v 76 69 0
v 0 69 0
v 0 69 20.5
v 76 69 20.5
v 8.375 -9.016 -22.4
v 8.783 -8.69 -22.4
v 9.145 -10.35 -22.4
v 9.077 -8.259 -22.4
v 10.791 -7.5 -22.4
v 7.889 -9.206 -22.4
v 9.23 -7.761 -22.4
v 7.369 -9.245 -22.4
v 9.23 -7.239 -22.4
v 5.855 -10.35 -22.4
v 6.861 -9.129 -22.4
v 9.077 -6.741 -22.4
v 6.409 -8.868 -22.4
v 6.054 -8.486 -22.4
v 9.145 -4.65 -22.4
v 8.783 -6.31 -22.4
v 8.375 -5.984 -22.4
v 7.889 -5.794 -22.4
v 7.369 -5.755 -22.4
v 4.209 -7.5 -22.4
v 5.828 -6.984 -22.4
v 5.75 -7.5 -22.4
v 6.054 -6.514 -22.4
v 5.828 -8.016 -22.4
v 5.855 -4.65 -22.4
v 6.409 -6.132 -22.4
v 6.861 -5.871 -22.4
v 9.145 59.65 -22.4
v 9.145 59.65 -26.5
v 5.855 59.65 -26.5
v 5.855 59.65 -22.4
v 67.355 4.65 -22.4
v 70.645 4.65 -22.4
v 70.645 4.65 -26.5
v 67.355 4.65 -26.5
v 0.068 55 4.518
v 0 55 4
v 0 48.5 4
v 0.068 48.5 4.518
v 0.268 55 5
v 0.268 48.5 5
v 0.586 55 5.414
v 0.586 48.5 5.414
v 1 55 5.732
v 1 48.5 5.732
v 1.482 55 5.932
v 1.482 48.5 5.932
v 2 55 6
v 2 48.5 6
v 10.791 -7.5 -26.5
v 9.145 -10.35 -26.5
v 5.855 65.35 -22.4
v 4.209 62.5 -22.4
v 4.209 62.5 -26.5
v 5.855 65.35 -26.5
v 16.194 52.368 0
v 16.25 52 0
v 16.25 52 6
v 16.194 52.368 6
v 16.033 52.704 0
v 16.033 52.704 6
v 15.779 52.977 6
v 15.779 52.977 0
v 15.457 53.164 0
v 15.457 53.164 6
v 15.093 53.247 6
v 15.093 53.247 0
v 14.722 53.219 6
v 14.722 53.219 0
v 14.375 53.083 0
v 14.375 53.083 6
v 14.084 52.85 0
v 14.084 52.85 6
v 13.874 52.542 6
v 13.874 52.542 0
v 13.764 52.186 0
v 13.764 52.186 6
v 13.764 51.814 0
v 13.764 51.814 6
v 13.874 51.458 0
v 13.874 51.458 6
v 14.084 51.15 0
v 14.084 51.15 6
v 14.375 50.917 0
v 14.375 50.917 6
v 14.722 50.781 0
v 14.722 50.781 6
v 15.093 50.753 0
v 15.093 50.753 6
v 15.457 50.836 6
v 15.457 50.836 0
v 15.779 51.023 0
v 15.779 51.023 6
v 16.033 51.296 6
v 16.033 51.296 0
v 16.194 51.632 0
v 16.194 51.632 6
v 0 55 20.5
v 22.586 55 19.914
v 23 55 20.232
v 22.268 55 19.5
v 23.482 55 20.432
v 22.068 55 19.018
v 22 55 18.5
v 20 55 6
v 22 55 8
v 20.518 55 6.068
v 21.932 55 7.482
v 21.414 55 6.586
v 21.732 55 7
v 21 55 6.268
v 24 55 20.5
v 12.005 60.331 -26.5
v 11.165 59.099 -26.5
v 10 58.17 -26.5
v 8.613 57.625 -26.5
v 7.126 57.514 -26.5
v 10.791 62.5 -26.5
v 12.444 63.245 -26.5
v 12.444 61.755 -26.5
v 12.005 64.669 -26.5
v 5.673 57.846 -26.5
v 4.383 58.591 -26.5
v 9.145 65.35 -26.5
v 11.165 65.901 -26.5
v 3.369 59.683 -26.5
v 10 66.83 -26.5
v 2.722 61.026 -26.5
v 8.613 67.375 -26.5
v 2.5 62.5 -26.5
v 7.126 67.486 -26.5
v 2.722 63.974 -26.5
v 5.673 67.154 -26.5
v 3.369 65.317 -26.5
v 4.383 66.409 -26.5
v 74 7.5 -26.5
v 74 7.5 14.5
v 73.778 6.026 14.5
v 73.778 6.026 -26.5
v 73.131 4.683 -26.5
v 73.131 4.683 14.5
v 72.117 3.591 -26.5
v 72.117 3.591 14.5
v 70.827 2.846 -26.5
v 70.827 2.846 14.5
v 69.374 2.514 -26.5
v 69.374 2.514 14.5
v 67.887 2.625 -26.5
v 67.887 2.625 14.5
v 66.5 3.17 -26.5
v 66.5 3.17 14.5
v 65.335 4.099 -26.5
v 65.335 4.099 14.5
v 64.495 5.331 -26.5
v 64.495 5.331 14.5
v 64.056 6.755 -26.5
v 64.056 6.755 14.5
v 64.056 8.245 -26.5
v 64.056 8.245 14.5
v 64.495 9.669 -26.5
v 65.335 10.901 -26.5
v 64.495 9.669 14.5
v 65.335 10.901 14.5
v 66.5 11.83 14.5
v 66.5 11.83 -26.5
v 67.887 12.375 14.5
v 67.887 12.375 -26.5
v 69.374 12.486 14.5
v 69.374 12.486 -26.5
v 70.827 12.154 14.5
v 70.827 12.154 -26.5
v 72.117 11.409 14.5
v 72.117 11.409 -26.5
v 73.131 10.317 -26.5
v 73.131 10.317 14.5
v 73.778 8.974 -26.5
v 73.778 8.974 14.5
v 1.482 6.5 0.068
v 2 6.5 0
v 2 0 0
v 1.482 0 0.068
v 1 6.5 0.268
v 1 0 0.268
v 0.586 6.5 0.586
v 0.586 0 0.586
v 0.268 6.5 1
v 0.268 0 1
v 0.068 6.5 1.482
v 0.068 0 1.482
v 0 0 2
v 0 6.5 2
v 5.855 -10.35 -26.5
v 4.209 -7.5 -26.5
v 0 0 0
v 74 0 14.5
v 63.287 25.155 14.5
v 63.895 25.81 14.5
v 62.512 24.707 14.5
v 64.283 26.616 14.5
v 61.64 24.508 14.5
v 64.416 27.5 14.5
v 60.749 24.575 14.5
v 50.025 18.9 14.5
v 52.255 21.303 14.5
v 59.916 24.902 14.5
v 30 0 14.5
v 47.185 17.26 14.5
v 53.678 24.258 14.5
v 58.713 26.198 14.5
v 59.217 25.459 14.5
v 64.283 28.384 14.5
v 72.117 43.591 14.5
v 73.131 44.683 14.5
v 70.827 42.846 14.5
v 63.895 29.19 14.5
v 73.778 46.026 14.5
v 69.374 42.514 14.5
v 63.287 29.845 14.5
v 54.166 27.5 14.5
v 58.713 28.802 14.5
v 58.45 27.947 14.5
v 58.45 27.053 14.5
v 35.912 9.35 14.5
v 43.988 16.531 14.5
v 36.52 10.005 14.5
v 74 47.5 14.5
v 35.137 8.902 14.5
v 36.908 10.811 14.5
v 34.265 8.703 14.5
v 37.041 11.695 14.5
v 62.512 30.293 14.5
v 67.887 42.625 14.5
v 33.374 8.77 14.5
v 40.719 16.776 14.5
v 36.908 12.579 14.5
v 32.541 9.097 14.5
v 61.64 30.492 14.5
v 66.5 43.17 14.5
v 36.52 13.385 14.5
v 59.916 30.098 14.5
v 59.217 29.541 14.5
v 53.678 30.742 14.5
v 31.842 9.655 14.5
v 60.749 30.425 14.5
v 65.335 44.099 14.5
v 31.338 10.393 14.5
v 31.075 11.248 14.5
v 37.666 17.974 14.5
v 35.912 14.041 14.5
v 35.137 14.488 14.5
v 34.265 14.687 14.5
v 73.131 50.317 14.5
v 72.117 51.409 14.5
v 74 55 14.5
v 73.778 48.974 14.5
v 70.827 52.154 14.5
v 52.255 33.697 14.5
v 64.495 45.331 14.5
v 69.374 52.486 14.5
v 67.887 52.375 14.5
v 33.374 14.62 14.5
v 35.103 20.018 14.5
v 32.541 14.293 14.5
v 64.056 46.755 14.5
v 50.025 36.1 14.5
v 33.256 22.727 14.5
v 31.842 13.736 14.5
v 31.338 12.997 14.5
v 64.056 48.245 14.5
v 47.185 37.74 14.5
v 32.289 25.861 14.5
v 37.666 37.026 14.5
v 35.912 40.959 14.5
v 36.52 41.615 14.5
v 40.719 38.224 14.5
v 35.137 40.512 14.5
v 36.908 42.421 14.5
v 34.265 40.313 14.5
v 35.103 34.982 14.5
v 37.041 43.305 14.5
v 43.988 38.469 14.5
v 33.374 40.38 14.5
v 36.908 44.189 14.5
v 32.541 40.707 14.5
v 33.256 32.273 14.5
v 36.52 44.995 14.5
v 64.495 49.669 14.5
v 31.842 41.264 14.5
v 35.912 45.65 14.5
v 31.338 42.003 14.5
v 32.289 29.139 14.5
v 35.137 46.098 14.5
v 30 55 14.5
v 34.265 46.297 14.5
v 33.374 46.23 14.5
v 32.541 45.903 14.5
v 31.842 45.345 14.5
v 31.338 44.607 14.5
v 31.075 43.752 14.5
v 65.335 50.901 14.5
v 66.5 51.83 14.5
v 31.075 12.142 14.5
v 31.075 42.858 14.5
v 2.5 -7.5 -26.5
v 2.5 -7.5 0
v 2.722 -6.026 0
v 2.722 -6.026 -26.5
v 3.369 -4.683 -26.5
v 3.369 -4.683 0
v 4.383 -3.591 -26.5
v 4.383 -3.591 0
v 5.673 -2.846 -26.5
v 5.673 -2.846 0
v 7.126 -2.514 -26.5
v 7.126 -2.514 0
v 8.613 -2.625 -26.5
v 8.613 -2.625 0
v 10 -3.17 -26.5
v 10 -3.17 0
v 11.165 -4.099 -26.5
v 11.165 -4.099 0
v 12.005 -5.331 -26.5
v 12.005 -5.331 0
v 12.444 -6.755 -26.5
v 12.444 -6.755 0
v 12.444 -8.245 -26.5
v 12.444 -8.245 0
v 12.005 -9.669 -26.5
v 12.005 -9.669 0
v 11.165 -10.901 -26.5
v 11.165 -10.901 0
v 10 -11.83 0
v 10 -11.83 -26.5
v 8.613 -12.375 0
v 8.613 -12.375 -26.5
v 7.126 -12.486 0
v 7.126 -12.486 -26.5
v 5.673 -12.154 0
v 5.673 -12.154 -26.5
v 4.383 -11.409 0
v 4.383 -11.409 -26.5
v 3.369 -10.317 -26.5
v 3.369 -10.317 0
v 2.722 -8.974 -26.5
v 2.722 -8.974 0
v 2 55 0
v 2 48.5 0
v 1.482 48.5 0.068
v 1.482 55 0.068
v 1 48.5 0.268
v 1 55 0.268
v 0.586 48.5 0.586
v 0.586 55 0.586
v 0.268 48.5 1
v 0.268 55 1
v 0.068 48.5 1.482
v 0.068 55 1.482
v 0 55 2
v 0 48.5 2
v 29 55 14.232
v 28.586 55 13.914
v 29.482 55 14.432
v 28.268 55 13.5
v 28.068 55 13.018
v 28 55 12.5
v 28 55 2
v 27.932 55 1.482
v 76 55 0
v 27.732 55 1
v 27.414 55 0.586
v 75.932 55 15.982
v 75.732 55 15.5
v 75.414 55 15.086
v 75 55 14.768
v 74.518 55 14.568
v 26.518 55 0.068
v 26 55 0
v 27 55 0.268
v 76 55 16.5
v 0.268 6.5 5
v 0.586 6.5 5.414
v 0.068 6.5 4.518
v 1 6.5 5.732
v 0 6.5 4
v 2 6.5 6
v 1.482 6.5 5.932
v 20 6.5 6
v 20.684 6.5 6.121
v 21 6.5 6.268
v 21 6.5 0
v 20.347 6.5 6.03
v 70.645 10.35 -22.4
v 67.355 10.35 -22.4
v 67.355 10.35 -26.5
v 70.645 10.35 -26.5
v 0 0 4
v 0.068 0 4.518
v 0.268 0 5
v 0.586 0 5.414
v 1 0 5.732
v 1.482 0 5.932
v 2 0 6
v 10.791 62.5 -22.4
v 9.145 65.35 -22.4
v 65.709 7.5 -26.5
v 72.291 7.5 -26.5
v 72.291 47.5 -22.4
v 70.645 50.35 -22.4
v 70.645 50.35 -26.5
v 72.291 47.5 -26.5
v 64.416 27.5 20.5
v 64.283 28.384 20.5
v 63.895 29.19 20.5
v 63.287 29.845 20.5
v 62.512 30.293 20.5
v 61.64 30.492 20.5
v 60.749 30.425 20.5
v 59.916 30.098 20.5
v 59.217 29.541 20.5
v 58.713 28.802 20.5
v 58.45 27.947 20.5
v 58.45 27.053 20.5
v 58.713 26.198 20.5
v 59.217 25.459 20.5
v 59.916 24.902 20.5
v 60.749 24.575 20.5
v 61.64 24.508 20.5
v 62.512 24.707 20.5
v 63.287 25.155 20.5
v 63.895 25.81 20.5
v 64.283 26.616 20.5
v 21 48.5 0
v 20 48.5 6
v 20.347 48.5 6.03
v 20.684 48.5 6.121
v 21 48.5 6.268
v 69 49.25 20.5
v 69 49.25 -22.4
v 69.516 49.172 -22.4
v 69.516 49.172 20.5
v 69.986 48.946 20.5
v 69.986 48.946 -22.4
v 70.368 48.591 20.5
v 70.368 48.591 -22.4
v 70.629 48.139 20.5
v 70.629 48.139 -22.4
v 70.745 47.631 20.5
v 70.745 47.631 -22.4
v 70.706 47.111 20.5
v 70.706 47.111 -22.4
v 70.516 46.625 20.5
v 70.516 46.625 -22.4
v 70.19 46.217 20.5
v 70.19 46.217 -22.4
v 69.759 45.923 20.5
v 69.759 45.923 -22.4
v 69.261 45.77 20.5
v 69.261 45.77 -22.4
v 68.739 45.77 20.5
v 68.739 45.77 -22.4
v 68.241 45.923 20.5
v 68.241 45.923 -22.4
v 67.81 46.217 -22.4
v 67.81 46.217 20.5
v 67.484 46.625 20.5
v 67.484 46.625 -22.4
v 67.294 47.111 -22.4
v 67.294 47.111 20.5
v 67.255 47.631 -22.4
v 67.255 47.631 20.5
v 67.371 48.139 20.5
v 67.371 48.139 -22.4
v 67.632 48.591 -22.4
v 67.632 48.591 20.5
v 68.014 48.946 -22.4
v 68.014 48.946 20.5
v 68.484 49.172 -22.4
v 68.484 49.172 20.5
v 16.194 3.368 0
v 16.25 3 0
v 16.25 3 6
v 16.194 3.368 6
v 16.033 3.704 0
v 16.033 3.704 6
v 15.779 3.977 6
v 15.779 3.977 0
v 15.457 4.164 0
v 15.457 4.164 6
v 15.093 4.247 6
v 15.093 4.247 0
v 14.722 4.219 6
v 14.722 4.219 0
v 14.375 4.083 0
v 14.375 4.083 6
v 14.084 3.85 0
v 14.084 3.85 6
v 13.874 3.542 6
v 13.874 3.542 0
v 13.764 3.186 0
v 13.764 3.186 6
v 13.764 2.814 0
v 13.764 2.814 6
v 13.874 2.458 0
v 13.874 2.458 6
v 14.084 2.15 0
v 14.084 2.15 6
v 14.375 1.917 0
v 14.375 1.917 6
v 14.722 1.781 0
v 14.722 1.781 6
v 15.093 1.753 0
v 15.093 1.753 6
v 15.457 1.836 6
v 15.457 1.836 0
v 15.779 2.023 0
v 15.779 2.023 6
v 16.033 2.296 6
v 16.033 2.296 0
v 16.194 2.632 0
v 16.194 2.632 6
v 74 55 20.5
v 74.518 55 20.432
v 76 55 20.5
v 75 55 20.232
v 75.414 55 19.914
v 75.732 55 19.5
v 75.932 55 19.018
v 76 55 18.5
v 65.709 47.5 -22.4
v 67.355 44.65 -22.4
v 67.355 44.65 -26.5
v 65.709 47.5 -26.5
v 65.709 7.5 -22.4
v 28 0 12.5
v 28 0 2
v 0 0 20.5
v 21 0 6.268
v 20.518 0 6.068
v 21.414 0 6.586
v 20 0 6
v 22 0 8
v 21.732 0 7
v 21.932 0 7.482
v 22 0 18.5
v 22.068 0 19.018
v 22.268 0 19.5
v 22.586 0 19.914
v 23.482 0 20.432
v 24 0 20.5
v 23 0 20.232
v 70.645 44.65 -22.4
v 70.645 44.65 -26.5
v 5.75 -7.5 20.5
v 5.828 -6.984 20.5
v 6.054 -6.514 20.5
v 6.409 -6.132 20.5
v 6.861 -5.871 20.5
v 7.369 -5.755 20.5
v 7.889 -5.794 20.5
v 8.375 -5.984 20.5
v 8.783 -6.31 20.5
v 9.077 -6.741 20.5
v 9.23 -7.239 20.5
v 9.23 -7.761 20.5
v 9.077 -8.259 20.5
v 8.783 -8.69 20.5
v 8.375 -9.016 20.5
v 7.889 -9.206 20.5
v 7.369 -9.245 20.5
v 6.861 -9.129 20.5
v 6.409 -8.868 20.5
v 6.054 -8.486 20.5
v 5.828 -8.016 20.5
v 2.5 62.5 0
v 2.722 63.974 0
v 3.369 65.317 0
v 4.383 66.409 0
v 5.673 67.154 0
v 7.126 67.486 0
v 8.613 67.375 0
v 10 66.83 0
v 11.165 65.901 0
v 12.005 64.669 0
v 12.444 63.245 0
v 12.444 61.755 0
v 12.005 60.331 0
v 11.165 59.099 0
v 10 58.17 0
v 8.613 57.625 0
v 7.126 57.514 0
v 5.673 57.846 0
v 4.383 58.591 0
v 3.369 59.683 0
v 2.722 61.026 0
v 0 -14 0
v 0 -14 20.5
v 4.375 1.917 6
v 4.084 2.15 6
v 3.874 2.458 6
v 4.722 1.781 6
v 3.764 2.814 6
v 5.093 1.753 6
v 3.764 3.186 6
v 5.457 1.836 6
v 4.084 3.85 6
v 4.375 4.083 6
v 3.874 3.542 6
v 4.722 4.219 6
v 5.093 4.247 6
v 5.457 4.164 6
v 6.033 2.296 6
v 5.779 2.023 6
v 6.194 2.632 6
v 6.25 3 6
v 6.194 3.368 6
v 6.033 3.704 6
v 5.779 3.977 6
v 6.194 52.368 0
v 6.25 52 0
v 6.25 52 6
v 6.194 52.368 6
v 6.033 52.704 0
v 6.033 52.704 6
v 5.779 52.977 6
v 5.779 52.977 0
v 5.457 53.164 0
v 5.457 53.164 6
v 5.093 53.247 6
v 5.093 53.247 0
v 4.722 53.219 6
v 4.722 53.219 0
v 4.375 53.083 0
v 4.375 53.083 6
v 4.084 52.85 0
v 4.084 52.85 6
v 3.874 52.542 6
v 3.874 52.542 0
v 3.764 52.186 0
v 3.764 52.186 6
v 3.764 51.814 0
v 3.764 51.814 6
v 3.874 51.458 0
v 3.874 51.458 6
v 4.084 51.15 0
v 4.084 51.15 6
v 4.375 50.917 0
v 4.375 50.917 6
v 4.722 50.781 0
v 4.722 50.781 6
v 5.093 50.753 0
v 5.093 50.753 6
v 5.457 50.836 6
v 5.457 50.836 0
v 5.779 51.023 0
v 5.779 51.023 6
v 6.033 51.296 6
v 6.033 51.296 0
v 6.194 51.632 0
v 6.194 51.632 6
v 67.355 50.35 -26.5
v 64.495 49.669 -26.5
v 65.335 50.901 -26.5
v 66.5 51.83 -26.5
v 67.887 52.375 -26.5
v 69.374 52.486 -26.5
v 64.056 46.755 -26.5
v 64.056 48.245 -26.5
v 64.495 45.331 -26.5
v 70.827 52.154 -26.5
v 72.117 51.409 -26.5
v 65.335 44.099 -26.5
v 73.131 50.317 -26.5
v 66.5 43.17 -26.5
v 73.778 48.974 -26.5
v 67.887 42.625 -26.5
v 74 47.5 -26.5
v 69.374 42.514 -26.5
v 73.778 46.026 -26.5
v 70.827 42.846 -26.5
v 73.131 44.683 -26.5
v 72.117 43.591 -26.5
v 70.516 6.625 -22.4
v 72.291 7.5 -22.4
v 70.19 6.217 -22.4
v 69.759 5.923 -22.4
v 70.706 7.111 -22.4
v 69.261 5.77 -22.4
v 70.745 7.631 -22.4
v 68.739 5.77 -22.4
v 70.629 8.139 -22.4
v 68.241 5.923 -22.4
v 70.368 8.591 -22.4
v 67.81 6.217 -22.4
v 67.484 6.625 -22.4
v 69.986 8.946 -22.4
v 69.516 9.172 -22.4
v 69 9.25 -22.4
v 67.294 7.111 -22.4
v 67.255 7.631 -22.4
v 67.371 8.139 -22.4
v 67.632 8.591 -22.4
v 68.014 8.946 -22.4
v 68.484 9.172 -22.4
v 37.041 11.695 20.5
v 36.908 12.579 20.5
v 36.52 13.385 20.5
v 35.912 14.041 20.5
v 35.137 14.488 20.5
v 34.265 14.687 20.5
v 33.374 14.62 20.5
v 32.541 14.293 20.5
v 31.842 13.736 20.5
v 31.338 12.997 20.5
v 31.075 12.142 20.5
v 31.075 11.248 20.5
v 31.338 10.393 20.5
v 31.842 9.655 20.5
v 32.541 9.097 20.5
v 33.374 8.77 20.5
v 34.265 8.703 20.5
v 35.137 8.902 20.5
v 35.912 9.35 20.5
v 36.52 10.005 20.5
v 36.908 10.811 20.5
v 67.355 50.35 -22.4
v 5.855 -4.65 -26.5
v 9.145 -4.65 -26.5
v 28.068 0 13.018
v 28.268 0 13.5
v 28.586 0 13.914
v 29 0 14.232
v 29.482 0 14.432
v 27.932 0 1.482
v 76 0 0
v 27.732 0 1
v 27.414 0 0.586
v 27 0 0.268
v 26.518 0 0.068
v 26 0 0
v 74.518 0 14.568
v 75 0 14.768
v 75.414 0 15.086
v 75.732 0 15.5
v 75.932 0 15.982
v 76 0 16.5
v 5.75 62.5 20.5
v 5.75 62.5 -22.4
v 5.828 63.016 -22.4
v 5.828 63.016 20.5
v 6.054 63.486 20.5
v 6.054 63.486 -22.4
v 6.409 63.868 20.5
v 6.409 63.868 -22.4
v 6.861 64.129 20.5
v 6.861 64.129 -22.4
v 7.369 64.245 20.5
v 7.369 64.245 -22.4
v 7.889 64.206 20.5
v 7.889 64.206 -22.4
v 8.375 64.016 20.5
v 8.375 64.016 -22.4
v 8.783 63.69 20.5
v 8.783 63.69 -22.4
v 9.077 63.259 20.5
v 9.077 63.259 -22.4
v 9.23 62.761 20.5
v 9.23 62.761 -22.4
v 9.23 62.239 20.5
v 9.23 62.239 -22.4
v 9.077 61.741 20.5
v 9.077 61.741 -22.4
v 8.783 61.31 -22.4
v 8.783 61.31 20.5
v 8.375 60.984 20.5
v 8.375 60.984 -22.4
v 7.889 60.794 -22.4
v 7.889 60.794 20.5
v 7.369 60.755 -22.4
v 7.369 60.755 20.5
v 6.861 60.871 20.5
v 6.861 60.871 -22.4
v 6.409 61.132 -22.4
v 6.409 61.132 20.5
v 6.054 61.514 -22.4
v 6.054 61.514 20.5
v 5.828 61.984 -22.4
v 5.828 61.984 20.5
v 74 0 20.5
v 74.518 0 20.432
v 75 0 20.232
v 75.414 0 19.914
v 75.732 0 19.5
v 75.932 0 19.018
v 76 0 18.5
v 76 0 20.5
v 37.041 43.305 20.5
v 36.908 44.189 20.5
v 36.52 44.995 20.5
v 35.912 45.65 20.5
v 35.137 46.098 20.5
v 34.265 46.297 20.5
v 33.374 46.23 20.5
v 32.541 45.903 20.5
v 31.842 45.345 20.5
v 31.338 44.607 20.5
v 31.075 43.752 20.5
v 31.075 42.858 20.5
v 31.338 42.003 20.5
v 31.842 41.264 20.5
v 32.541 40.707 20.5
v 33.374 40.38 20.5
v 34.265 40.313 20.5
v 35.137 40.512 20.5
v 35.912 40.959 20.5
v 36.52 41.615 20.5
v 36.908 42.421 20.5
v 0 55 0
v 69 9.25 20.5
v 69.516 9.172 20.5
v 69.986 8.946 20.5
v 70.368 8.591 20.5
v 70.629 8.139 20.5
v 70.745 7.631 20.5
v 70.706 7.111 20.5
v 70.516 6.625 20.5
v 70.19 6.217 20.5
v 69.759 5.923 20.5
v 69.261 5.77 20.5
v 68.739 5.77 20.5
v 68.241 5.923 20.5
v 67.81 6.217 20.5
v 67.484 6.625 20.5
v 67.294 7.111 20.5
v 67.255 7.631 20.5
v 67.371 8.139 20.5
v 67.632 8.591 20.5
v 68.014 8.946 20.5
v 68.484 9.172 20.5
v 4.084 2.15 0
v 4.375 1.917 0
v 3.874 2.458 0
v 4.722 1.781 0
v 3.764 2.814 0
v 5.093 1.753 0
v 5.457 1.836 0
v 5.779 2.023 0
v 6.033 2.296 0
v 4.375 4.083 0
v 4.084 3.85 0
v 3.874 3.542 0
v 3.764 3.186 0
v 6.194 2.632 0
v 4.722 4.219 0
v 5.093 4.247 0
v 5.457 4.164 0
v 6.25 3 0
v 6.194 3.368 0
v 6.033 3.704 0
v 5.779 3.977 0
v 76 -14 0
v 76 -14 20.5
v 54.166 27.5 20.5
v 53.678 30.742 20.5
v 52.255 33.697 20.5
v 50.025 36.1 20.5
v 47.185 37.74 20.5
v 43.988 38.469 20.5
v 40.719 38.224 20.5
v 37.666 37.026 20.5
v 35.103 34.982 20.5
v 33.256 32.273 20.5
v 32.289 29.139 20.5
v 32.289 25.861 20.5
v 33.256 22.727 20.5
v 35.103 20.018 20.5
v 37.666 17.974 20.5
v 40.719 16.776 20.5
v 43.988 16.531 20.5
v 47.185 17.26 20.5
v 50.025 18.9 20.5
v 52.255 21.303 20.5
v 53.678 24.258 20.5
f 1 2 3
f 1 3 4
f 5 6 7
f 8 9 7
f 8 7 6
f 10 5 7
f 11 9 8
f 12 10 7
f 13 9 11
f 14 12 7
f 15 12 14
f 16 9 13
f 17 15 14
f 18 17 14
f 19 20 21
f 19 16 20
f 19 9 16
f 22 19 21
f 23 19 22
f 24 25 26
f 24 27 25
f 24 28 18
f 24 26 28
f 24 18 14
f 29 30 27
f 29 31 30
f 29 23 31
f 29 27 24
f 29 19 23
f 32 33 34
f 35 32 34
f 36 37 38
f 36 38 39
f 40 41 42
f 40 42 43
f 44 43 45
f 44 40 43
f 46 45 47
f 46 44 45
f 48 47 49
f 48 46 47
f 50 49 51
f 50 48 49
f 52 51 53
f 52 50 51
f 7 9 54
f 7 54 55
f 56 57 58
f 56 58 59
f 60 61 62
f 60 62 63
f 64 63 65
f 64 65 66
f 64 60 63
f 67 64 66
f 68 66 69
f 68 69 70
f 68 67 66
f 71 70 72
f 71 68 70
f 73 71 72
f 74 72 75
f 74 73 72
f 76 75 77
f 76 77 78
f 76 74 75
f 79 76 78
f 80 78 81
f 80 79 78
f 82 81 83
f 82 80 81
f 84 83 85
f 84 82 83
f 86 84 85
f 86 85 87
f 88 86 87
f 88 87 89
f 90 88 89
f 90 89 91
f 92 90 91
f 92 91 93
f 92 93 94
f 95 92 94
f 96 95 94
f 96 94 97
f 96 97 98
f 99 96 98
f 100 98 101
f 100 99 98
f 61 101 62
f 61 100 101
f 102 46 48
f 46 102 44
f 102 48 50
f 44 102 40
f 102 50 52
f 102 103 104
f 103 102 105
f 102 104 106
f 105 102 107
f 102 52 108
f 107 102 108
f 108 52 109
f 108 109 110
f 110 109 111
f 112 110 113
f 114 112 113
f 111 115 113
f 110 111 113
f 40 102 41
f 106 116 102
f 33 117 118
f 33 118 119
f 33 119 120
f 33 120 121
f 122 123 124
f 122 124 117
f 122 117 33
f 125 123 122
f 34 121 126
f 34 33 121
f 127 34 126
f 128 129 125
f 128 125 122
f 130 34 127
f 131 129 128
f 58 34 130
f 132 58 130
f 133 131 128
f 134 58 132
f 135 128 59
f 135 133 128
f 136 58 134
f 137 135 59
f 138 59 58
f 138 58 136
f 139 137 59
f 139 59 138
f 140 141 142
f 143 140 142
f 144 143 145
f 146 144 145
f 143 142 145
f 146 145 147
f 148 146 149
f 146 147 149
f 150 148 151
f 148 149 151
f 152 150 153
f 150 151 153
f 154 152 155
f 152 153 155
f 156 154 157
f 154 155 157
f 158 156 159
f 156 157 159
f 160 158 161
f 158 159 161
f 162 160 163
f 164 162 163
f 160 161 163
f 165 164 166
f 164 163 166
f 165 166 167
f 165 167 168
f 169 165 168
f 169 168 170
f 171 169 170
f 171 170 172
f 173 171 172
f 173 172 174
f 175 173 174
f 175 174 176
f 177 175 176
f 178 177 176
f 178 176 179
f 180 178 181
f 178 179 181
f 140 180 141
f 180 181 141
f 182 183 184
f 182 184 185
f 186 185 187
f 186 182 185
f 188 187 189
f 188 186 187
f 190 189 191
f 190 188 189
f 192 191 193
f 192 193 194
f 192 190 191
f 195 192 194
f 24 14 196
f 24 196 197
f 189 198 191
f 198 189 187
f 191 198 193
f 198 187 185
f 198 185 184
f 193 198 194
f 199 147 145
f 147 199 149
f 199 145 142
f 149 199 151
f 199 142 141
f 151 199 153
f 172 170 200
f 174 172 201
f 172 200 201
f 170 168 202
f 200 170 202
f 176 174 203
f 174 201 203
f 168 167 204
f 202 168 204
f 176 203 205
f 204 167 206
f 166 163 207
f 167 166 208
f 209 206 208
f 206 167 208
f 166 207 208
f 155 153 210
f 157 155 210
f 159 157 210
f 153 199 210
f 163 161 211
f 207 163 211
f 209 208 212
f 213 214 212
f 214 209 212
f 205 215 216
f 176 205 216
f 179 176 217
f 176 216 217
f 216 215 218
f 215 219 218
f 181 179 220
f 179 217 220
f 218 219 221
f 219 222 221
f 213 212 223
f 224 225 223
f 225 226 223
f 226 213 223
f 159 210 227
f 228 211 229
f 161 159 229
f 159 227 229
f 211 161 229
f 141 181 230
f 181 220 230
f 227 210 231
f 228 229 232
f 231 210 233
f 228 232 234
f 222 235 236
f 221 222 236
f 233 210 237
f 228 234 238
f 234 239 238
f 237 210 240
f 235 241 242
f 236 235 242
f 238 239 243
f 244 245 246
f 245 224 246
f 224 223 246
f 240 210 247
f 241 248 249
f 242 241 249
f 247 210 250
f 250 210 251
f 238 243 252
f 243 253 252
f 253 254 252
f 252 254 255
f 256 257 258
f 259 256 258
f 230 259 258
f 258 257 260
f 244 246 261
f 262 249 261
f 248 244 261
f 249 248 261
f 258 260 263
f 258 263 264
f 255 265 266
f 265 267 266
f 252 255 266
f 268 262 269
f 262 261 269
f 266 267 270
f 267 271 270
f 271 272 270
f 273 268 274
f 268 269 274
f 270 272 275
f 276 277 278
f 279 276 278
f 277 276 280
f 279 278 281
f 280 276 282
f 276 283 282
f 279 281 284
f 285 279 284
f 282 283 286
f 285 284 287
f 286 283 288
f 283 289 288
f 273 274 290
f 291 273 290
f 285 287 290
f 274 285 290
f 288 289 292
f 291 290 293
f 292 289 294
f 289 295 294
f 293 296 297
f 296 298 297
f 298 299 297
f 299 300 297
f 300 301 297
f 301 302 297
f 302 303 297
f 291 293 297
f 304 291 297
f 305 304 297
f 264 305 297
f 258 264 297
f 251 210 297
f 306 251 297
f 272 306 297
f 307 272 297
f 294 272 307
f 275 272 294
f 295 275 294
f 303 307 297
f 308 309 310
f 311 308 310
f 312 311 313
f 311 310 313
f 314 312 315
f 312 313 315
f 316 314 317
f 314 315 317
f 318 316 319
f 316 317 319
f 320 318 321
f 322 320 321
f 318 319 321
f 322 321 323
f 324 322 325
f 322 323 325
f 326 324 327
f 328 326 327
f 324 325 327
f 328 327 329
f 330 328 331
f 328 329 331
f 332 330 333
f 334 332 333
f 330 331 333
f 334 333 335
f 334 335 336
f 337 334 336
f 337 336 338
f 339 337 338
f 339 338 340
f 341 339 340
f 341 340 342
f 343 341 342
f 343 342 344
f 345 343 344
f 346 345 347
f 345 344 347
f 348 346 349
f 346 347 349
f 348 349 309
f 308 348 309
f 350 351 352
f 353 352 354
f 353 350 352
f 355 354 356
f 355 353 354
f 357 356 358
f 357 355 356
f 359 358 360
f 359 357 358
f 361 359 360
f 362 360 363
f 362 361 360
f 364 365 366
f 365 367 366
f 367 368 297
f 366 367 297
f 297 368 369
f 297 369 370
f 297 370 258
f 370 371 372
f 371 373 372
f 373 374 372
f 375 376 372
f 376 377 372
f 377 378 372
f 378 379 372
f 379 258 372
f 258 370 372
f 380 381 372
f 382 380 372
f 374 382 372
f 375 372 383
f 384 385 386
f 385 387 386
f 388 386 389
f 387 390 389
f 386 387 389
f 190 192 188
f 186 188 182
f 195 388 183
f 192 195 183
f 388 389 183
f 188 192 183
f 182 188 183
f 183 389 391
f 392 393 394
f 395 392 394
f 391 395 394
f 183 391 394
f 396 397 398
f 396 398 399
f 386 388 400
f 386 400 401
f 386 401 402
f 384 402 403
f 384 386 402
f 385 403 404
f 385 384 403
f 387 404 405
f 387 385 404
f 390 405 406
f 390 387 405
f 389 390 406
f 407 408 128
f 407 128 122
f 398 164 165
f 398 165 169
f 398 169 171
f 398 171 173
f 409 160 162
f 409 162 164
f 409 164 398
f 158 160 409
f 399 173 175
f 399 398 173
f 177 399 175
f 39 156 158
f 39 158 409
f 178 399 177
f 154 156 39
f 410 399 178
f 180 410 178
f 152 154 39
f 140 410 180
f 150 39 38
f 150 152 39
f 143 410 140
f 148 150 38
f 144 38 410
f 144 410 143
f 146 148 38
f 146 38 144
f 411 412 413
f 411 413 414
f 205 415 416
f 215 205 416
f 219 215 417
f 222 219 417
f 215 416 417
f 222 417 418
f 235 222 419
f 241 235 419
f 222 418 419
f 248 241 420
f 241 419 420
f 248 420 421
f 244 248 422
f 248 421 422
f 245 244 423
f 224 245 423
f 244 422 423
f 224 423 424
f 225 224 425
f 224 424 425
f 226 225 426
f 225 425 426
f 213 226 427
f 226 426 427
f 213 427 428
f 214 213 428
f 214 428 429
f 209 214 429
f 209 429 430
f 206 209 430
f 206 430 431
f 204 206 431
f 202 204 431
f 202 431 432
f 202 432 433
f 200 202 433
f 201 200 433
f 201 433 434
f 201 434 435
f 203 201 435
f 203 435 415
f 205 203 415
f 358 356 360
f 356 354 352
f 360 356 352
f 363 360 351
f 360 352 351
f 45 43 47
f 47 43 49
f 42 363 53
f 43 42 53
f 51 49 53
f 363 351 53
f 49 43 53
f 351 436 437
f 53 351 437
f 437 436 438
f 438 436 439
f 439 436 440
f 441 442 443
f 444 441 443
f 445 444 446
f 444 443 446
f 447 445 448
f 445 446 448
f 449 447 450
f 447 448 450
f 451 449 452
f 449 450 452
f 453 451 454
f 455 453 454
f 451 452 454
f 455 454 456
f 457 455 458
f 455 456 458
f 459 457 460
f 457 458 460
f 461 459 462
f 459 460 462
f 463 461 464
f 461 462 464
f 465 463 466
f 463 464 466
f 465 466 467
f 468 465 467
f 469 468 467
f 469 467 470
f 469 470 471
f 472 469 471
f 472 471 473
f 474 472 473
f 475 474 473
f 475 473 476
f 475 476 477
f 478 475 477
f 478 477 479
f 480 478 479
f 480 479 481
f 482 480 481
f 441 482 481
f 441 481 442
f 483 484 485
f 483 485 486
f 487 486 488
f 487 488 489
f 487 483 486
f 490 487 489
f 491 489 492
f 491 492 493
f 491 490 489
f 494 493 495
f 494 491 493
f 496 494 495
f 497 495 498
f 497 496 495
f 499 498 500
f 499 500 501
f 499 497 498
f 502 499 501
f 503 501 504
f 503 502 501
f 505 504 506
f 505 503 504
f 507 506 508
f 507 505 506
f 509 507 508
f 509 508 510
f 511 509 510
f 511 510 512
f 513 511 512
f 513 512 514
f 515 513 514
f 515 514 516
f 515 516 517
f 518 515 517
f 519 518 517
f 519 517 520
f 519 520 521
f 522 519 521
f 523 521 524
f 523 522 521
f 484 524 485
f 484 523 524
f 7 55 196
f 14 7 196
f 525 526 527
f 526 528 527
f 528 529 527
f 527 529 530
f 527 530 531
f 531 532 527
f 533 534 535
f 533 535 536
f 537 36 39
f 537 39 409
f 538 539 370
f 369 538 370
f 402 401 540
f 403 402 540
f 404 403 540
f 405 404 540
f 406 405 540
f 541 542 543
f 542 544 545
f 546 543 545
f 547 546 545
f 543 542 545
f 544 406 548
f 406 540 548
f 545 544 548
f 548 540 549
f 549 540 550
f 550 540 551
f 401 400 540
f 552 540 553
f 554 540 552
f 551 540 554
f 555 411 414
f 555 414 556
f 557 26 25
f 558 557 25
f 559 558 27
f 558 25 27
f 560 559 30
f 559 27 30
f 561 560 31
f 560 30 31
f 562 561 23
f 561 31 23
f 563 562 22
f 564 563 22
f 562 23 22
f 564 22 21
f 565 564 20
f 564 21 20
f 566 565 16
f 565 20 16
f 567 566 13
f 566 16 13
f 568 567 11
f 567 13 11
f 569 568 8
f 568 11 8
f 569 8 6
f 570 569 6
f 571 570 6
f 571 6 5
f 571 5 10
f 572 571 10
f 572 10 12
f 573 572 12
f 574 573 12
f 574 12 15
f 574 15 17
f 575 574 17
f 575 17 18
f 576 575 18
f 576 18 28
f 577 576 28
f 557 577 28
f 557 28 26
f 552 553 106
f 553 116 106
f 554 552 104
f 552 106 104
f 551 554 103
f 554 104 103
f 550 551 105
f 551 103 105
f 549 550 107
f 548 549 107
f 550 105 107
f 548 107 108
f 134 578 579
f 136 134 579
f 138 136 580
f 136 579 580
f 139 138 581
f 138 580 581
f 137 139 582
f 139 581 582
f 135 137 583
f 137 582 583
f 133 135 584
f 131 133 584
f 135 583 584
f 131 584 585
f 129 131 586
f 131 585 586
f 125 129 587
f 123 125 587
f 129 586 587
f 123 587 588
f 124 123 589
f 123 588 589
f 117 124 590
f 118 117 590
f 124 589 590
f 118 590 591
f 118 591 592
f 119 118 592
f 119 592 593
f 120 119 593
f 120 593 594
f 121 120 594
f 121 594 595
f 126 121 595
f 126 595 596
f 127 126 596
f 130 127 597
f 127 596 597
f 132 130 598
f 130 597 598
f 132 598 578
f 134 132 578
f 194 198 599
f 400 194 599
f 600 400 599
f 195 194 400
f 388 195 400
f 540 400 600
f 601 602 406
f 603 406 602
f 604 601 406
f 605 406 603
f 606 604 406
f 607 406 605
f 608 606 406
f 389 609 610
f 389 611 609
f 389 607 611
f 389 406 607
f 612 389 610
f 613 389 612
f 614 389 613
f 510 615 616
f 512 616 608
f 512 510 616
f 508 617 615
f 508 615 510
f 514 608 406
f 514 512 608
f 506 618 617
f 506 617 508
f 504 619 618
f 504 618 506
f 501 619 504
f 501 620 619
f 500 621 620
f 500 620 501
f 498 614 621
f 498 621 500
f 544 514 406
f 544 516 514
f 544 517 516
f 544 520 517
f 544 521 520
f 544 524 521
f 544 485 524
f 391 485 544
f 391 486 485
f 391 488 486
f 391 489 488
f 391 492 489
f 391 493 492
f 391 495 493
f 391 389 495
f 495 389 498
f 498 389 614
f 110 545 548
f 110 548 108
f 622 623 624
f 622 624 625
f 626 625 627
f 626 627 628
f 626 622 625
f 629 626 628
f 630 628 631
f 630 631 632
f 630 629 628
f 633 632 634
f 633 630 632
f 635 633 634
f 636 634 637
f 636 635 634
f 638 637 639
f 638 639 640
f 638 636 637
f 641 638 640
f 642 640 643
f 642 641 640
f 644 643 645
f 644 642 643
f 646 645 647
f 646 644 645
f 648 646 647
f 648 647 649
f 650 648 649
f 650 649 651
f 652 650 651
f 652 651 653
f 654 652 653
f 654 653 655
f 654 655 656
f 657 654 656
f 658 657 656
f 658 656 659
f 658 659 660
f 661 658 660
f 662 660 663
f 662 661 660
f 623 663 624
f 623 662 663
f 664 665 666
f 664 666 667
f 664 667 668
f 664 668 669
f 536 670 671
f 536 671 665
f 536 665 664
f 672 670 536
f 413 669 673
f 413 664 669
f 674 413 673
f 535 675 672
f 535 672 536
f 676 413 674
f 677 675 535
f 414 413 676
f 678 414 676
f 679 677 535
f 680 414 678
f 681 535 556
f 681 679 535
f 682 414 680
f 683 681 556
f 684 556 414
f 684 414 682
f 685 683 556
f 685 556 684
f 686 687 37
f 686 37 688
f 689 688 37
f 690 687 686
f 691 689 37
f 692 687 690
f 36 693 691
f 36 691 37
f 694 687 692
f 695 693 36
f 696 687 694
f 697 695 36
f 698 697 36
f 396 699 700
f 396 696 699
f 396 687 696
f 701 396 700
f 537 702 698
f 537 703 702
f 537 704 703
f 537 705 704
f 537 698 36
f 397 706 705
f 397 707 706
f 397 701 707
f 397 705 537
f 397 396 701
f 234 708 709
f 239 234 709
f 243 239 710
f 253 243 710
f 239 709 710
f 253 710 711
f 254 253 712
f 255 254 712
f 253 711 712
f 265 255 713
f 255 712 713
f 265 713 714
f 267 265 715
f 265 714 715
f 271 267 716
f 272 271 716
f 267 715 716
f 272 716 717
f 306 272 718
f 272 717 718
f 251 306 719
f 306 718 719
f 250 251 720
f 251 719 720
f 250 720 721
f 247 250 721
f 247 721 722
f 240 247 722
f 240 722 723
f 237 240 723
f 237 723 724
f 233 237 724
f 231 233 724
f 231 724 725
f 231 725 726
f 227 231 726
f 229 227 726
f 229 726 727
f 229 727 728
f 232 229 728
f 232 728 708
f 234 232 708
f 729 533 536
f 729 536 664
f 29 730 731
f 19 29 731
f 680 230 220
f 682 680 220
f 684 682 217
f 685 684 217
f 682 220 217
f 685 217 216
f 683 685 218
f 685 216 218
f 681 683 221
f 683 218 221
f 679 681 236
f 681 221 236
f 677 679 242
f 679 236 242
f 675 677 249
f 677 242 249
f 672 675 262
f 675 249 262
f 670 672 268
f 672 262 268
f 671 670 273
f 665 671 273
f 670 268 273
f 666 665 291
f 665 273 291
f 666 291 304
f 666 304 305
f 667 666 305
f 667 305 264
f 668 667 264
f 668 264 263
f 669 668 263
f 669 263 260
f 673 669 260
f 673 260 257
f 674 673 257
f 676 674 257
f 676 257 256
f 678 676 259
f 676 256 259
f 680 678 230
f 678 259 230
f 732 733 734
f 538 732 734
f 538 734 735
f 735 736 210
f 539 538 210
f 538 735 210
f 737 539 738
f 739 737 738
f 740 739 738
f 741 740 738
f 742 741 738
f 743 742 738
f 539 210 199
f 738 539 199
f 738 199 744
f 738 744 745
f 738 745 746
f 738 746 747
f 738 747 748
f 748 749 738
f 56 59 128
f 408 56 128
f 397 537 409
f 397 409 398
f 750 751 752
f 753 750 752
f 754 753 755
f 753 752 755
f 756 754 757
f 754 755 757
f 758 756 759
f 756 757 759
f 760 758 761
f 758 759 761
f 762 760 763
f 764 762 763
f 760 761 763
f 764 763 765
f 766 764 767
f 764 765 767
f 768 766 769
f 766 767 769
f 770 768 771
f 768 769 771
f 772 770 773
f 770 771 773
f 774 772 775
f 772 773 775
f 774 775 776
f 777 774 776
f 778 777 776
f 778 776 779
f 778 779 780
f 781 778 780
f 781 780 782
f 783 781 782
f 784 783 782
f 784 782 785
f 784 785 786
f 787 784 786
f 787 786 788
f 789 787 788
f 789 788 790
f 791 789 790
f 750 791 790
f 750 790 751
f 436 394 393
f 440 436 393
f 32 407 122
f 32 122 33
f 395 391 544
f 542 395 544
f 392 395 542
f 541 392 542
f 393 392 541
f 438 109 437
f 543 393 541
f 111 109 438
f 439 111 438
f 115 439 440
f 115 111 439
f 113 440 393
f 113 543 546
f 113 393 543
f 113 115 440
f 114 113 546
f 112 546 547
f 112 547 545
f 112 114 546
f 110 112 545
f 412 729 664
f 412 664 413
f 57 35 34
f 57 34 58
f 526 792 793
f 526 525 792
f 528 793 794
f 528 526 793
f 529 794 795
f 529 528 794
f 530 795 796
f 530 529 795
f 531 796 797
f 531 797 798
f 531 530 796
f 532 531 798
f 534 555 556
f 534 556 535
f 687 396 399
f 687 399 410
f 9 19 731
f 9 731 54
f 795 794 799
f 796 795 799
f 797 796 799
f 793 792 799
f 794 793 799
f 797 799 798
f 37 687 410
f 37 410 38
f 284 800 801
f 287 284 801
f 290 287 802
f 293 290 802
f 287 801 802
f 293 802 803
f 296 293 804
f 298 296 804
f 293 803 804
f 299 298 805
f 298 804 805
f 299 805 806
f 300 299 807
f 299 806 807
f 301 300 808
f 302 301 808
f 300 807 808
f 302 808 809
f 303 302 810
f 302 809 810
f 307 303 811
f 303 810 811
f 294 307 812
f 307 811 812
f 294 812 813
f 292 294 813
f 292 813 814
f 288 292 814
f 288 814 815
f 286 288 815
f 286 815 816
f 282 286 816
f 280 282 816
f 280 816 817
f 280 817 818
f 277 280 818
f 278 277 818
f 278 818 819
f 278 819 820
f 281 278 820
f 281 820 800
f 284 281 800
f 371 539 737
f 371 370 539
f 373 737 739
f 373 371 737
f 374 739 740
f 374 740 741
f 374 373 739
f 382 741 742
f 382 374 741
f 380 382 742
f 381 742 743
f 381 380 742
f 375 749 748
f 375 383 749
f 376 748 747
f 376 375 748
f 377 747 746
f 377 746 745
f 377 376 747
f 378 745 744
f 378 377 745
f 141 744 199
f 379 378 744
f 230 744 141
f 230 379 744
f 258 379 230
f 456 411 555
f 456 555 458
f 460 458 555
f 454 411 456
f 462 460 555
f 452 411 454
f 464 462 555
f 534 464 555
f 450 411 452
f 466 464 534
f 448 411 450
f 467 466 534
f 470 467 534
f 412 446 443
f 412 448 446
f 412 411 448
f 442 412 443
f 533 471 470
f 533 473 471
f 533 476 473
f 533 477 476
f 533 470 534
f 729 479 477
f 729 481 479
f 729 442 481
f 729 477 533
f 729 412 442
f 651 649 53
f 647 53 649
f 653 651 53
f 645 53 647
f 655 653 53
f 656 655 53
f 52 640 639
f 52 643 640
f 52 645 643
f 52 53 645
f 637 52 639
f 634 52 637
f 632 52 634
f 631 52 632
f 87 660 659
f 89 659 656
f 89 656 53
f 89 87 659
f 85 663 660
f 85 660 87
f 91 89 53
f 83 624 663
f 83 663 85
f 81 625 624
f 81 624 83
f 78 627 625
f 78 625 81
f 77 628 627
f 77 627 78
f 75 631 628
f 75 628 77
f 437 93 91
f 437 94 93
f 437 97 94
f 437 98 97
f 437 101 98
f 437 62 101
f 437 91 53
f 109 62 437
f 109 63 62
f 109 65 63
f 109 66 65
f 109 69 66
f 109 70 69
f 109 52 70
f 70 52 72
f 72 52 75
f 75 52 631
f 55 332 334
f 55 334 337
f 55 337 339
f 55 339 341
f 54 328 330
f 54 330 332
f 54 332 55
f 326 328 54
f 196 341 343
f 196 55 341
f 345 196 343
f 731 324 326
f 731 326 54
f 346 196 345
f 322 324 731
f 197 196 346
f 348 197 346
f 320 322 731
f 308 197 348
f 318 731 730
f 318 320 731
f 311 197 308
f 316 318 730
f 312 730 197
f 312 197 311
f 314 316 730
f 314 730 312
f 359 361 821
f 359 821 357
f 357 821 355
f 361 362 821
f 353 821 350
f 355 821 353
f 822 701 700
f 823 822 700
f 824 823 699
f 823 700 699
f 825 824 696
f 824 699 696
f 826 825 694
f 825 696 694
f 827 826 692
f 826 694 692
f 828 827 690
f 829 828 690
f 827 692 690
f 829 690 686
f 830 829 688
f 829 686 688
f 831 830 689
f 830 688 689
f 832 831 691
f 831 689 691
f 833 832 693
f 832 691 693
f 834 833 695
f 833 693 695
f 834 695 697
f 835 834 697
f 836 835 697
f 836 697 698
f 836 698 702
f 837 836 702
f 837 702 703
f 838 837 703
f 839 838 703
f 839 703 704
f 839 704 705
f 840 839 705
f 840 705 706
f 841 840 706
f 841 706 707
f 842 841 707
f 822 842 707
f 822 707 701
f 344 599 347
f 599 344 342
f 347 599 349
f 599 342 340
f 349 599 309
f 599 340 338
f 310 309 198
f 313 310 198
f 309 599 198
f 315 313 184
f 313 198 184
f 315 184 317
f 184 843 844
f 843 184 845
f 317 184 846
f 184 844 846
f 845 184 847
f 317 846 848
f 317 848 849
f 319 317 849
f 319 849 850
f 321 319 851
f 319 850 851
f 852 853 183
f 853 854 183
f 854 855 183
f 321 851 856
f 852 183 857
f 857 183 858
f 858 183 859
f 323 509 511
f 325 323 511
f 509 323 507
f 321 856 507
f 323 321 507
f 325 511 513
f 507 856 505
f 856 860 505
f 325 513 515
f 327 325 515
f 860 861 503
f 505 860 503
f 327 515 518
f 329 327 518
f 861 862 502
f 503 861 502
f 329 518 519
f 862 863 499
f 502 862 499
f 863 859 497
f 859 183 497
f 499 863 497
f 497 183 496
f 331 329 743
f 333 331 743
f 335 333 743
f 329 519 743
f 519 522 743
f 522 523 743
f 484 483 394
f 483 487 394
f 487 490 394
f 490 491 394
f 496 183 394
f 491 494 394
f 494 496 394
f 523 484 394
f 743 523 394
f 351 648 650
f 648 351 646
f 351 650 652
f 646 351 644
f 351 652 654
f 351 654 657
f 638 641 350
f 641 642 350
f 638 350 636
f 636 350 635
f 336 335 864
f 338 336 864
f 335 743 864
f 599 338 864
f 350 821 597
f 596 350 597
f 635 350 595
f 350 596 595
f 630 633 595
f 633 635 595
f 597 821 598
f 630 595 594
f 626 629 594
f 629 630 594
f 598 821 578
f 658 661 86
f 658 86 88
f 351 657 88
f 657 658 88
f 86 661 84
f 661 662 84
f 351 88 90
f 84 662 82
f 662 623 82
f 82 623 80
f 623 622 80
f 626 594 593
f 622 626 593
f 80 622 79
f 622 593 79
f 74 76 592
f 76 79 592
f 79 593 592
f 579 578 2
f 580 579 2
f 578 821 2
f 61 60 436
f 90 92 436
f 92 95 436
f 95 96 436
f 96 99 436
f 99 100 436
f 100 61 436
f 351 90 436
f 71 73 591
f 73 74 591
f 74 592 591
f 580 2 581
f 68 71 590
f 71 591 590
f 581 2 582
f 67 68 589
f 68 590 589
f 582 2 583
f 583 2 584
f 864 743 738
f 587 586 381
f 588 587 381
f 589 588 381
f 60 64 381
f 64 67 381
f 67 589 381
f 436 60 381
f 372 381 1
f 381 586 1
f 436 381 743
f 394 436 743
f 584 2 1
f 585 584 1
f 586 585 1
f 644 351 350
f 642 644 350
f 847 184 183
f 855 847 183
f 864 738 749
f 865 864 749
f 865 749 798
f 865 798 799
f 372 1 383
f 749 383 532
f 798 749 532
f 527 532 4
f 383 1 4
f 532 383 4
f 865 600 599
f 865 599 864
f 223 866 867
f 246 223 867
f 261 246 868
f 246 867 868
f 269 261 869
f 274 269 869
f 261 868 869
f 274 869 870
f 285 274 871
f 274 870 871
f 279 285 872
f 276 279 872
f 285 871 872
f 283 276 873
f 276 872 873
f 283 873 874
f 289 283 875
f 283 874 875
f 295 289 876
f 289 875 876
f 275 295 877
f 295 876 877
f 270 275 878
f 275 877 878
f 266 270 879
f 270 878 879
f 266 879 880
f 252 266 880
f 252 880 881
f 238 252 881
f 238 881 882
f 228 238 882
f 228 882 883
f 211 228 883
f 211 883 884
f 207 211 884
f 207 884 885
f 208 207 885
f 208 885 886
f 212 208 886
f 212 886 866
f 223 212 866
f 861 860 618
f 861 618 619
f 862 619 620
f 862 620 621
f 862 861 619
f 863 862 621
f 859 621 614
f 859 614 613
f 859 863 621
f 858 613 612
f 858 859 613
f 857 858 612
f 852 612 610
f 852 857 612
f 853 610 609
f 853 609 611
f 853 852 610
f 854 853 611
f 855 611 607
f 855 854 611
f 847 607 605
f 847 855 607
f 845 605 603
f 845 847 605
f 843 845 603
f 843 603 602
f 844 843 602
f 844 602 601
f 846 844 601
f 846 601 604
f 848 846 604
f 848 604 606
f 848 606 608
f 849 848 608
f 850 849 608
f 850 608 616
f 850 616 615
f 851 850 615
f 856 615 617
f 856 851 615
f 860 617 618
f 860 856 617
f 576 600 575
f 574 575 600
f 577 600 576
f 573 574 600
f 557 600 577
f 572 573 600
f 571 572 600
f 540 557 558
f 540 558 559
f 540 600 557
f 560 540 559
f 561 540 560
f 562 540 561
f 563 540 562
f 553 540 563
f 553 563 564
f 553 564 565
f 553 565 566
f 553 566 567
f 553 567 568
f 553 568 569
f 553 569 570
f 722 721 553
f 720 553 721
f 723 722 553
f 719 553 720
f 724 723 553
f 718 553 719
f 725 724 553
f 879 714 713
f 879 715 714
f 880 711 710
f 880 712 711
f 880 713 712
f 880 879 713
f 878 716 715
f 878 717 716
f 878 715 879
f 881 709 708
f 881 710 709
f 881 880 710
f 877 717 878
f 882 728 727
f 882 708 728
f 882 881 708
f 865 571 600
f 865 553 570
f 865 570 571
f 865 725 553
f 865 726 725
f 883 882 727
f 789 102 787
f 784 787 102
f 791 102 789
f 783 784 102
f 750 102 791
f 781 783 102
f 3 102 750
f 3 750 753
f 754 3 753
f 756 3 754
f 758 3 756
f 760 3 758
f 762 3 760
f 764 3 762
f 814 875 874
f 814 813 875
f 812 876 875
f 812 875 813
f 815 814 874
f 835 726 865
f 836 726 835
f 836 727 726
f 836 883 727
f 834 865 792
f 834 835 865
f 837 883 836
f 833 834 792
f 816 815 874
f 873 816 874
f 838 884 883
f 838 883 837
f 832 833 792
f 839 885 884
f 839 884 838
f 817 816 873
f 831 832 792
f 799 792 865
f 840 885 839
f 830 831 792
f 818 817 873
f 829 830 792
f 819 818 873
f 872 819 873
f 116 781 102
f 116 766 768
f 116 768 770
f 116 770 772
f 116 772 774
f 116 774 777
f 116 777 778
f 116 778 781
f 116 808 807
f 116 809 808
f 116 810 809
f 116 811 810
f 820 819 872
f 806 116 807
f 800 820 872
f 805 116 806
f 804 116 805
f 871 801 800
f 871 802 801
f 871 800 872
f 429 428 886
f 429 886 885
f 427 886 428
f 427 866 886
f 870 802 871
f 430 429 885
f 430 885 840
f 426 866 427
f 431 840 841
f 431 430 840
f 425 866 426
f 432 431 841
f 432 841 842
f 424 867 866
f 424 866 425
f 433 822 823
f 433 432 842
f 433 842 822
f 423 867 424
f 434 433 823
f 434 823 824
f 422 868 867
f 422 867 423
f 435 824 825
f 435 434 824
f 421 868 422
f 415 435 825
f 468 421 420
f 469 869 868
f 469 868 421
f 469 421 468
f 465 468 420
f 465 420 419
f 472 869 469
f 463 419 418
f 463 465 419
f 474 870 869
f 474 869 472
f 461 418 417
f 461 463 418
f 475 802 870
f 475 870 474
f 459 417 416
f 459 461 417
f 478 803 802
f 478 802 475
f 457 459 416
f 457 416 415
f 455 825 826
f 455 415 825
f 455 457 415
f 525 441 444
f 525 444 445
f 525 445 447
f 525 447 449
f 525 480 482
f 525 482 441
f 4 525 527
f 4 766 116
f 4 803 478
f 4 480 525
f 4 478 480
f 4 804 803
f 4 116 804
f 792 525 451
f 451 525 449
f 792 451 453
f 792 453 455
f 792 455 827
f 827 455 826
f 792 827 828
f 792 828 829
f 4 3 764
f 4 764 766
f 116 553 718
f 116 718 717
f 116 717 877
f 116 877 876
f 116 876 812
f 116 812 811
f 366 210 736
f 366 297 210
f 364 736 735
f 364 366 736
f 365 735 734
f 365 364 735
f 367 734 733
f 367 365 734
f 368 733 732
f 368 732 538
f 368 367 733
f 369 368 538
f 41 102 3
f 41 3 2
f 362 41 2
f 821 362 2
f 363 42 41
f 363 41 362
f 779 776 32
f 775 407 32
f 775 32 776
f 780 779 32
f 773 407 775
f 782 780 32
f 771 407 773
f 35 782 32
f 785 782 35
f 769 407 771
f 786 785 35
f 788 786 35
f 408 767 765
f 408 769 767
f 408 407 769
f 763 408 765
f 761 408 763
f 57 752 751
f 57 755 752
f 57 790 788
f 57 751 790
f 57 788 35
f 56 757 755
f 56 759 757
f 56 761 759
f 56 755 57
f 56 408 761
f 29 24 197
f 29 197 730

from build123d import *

# Parameters (mm, degrees)
SKETCH1_W               = 28
SKETCH1_H               = 55
SKETCH1_R               = 1.25
BOSS_EXTRUDE1_DEPTH     = 6
SKETCH2_W               = 6
SKETCH2_H               = 55
BOSS_EXTRUDE2_DEPTH     = 14.5
SKETCH3_W               = 6
SKETCH3_H               = 55
BOSS_EXTRUDE3_DEPTH     = 48
SKETCH4_R               = 3
SKETCH4_R_2             = 11
CUT_EXTRUDE1_DEPTH      = 48
FILLET4_R               = 2
SKETCH5_W               = 21
SKETCH5_H               = 42
CUT_EXTRUDE2_DEPTH      = 10
FILLET5_R               = 2
ESQUISSE2_R             = 5
BOSS_EXTRU_3_DEPTH      = 41
ESQUISSE3_R             = 1.75
ENL_V_MAT_EXTRU_1_DEPTH = 105.928547117
ESQUISSE4_W             = 76
ESQUISSE4_H             = 20.5
BOSS_EXTRU_4_DEPTH      = 14
ESQUISSE5_W             = 76
ESQUISSE5_H             = 20.5
BOSS_EXTRU_5_DEPTH      = 14
ESQUISSE7_R             = 5
BOSS_EXTRU_8_DEPTH      = 26.5
ESQUISSE10_R            = 1.75
ENL_V_MAT_EXTRU_2_DEPTH = 113.898184219
ENL_V_MAT_EXTRU_3_DEPTH = 4.1
ENL_V_MAT_EXTRU_4_DEPTH = 4.1


with BuildPart() as part:
    # Sketch1 → Boss-Extrude1 (new body)
    with BuildSketch(Plane.XY):
        with Locations((14, 27.5)):
            Rectangle(SKETCH1_W, SKETCH1_H)
        with Locations((5, 52)):
            Circle(SKETCH1_R, mode=Mode.SUBTRACT)
        with Locations((15, 52)):
            Circle(SKETCH1_R, mode=Mode.SUBTRACT)
        with Locations((5, 3)):
            Circle(SKETCH1_R, mode=Mode.SUBTRACT)
        with Locations((15, 3)):
            Circle(SKETCH1_R, mode=Mode.SUBTRACT)
    extrude(amount=BOSS_EXTRUDE1_DEPTH)

    # Sketch2 → Boss-Extrude2 (add)
    with BuildSketch(Plane.XY.offset(6)):
        with Locations((25, 27.5)):
            Rectangle(SKETCH2_W, SKETCH2_H)
    extrude(amount=BOSS_EXTRUDE2_DEPTH)

    # Sketch3 → Boss-Extrude3 (add)
    with BuildSketch(Plane(origin=(28, 0, 0), x_dir=(0, 0, -1), z_dir=(1, 0, 0))):
        with Locations((-17.5, 27.5)):
            Rectangle(SKETCH3_W, SKETCH3_H)
    extrude(amount=BOSS_EXTRUDE3_DEPTH)

    # Sketch4 → Cut-Extrude1 (cut)
    with BuildSketch(Plane.XY.offset(20.5)):
        with Locations((61.416247904, 27.5)):
            Circle(SKETCH4_R)
        with Locations((34.041247904, 11.695036381)):
            Circle(SKETCH4_R)
        with Locations((34.041247904, 43.304963619)):
            Circle(SKETCH4_R)
        with Locations((43.166247904, 27.5)):
            Circle(SKETCH4_R_2)
    extrude(amount=-CUT_EXTRUDE1_DEPTH, mode=Mode.SUBTRACT)

    # Fillet4
    fillet4_edges = [part.edges().sort_by_distance(p)[0] for p in [
        (22, 27.5, 20.5),
        (0, 27.5, 6),
        (0, 27.5, 0),
        (76, 27.5, 14.5),
        (28, 27.5, 14.5),
        (28, 27.5, 0),
        (76, 27.5, 20.5),
    ]]
    fillet(fillet4_edges, radius=FILLET4_R)

    # Sketch5 → Cut-Extrude2 (cut)
    with BuildSketch(Plane.XY.offset(6)):
        with Locations((10.5, 27.5)):
            Rectangle(SKETCH5_W, SKETCH5_H)
    extrude(amount=-CUT_EXTRUDE2_DEPTH, mode=Mode.SUBTRACT)

    # Fillet5
    # the kernel refuses this fillet: 2 mm, written as the material it adds along each edge
    with BuildSketch(Plane(origin=(22, 55, 6), x_dir=(-1, 0, 0), z_dir=(0, -1, 0))) as fillet5_piece_1_section:
        with BuildLine():
            CenterArc((FILLET5_R, -FILLET5_R), FILLET5_R, 90, 90)
            Line((0, -FILLET5_R), (0, 0))
            Line((0, 0), (FILLET5_R, 0))
        make_face()
    fillet5_piece_1 = extrude(amount=55, mode=Mode.PRIVATE)
    fillet5_piece_1 = split(fillet5_piece_1, bisect_by=Plane(origin=(21, 51.75, 6.048016763), z_dir=(-1, 0, 0)), keep=Keep.TOP, mode=Mode.PRIVATE)
    fillet5_piece_1 = split(fillet5_piece_1, bisect_by=Plane(origin=(20.673498431, 48.5, 6.048016763), z_dir=(0, 1, 0)), keep=Keep.TOP, mode=Mode.PRIVATE)
    add(fillet5_piece_1)
    with BuildSketch(Plane(origin=(22, 55, 6), x_dir=(-1, 0, 0), z_dir=(0, -1, 0))) as fillet5_piece_2_section:
        with BuildLine():
            CenterArc((FILLET5_R, -FILLET5_R), FILLET5_R, 90, 90)
            Line((0, -FILLET5_R), (0, 0))
            Line((0, 0), (FILLET5_R, 0))
        make_face()
    fillet5_piece_2 = extrude(amount=55, mode=Mode.PRIVATE)
    fillet5_piece_2 = split(fillet5_piece_2, bisect_by=Plane(origin=(21, 51.75, 6.51024012), z_dir=(1, 0, 0)), keep=Keep.TOP, mode=Mode.PRIVATE)
    fillet5_piece_2 = split(fillet5_piece_2, bisect_by=Plane(origin=(21.671216471, 48.5, 6.51024012), z_dir=(0, 1, 0)), keep=Keep.TOP, mode=Mode.PRIVATE)
    add(fillet5_piece_2)
    with BuildSketch(Plane(origin=(22, 55, 6), x_dir=(-1, 0, 0), z_dir=(0, -1, 0))) as fillet5_piece_3_section:
        with BuildLine():
            CenterArc((FILLET5_R, -FILLET5_R), FILLET5_R, 90, 90)
            Line((0, -FILLET5_R), (0, 0))
            Line((0, 0), (FILLET5_R, 0))
        make_face()
    fillet5_piece_3 = extrude(amount=55, mode=Mode.PRIVATE)
    fillet5_piece_3 = split(fillet5_piece_3, bisect_by=Plane(origin=(21.671216471, 6.5, 6.51024012), z_dir=(0, 1, 0)), keep=Keep.TOP, mode=Mode.PRIVATE)
    fillet5_piece_3 = split(fillet5_piece_3, bisect_by=Plane(origin=(21, 27.5, 6.51024012), z_dir=(1, 0, 0)), keep=Keep.TOP, mode=Mode.PRIVATE)
    fillet5_piece_3 = split(fillet5_piece_3, bisect_by=Plane(origin=(21.671216471, 48.5, 6.51024012), z_dir=(0, -1, 0)), keep=Keep.TOP, mode=Mode.PRIVATE)
    add(fillet5_piece_3)
    with BuildSketch(Plane(origin=(22, 55, 6), x_dir=(-1, 0, 0), z_dir=(0, -1, 0))) as fillet5_piece_4_section:
        with BuildLine():
            CenterArc((FILLET5_R, -FILLET5_R), FILLET5_R, 90, 90)
            Line((0, -FILLET5_R), (0, 0))
            Line((0, 0), (FILLET5_R, 0))
        make_face()
    fillet5_piece_4 = extrude(amount=55, mode=Mode.PRIVATE)
    fillet5_piece_4 = split(fillet5_piece_4, bisect_by=Plane(origin=(20.673498431, 6.5, 6.048016763), z_dir=(0, -1, 0)), keep=Keep.TOP, mode=Mode.PRIVATE)
    fillet5_piece_4 = split(fillet5_piece_4, bisect_by=Plane(origin=(21, 3.25, 6.048016763), z_dir=(-1, 0, 0)), keep=Keep.TOP, mode=Mode.PRIVATE)
    add(fillet5_piece_4)
    with BuildSketch(Plane(origin=(22, 55, 6), x_dir=(-1, 0, 0), z_dir=(0, -1, 0))) as fillet5_piece_5_section:
        with BuildLine():
            CenterArc((FILLET5_R, -FILLET5_R), FILLET5_R, 90, 90)
            Line((0, -FILLET5_R), (0, 0))
            Line((0, 0), (FILLET5_R, 0))
        make_face()
    fillet5_piece_5 = extrude(amount=55, mode=Mode.PRIVATE)
    fillet5_piece_5 = split(fillet5_piece_5, bisect_by=Plane(origin=(21.671216471, 6.5, 6.51024012), z_dir=(0, -1, 0)), keep=Keep.TOP, mode=Mode.PRIVATE)
    fillet5_piece_5 = split(fillet5_piece_5, bisect_by=Plane(origin=(21, 3.25, 6.51024012), z_dir=(1, 0, 0)), keep=Keep.TOP, mode=Mode.PRIVATE)
    add(fillet5_piece_5)

    # Esquisse2 → Boss.-Extru.3 (add)
    with BuildSketch(Plane(origin=(0, 0, 14.5), x_dir=(-1, 0, 0), z_dir=(0, 0, -1))):
        with Locations(Location((-69, 47.5, 0), (0, 0, 180))):
            Circle(ESQUISSE2_R)
        with Locations(Location((-69, 7.5, 0), (0, 0, 180))):
            Circle(ESQUISSE2_R)
    extrude(amount=BOSS_EXTRU_3_DEPTH)

    # Esquisse3 → Enlèv. mat.-Extru.1 (cut, through all)
    with BuildSketch(Plane(origin=(0, 0, -26.5), x_dir=(-1, 0, 0), z_dir=(0, 0, -1))):
        with Locations(Location((-69, 7.5, 0), (0, 0, 90))):
            Circle(ESQUISSE3_R)
        with Locations(Location((-69, 47.5, 0), (0, 0, 90))):
            Circle(ESQUISSE3_R)
    extrude(amount=-ENL_V_MAT_EXTRU_1_DEPTH, mode=Mode.SUBTRACT)

    # Esquisse4 → Boss.-Extru.4 (add)
    with BuildSketch(Plane(origin=(0, 55, 0), x_dir=(1, 0, 0), z_dir=(0, 1, 0))):
        with Locations((38, -10.25)):
            Rectangle(ESQUISSE4_W, ESQUISSE4_H)
    extrude(amount=BOSS_EXTRU_4_DEPTH)

    # Esquisse5 → Boss.-Extru.5 (add)
    with BuildSketch(Plane.XZ):
        with Locations((38, 10.25)):
            Rectangle(ESQUISSE5_W, ESQUISSE5_H)
    extrude(amount=BOSS_EXTRU_5_DEPTH)

    # Esquisse7 → Boss.-Extru.8 (add)
    with BuildSketch(Plane(origin=(0, 0, 0), x_dir=(-1, 0, 0), z_dir=(0, 0, -1))):
        with Locations((-7.5, -7.5)):
            Circle(ESQUISSE7_R)
        with Locations((-7.5, 62.5)):
            Circle(ESQUISSE7_R)
    extrude(amount=BOSS_EXTRU_8_DEPTH)

    # Esquisse10 → Enlèv. mat.-Extru.2 (cut, through all)
    with BuildSketch(Plane(origin=(0, 0, -26.5), x_dir=(-1, 0, 0), z_dir=(0, 0, -1))):
        with Locations((-7.5, 62.5)):
            Circle(ESQUISSE10_R)
        with Locations((-7.5, -7.5)):
            Circle(ESQUISSE10_R)
    extrude(amount=-ENL_V_MAT_EXTRU_2_DEPTH, mode=Mode.SUBTRACT)

    # Esquisse11 → Enlèv. mat.-Extru.3 (cut)
    with BuildSketch(Plane(origin=(0, 0, -26.5), x_dir=(-1, 0, 0), z_dir=(0, 0, -1))):
        Polygon((-9.145448267, -4.65), (-10.790896534, -7.5), (-9.145448267, -10.35), (-5.854551733, -10.35), (-4.209103466, -7.5), (-5.854551733, -4.65), align=None)
    extrude(amount=-ENL_V_MAT_EXTRU_3_DEPTH, mode=Mode.SUBTRACT)

    # Esquisse12 → Enlèv. mat.-Extru.4 (cut)
    with BuildSketch(Plane(origin=(0, 0, -26.5), x_dir=(-1, 0, 0), z_dir=(0, 0, -1))):
        Polygon((-9.145448267, 65.35), (-10.790896534, 62.5), (-9.145448267, 59.65), (-5.854551733, 59.65), (-4.209103466, 62.5), (-5.854551733, 65.35), align=None)
        Polygon((-70.645448267, 50.35), (-72.290896534, 47.5), (-70.645448267, 44.65), (-67.354551733, 44.65), (-65.709103466, 47.5), (-67.354551733, 50.35), align=None)
        Polygon((-70.645448267, 10.35), (-72.290896534, 7.5), (-70.645448267, 4.65), (-67.354551733, 4.65), (-65.709103466, 7.5), (-67.354551733, 10.35), align=None)
    extrude(amount=-ENL_V_MAT_EXTRU_4_DEPTH, mode=Mode.SUBTRACT)


solid = part.part
